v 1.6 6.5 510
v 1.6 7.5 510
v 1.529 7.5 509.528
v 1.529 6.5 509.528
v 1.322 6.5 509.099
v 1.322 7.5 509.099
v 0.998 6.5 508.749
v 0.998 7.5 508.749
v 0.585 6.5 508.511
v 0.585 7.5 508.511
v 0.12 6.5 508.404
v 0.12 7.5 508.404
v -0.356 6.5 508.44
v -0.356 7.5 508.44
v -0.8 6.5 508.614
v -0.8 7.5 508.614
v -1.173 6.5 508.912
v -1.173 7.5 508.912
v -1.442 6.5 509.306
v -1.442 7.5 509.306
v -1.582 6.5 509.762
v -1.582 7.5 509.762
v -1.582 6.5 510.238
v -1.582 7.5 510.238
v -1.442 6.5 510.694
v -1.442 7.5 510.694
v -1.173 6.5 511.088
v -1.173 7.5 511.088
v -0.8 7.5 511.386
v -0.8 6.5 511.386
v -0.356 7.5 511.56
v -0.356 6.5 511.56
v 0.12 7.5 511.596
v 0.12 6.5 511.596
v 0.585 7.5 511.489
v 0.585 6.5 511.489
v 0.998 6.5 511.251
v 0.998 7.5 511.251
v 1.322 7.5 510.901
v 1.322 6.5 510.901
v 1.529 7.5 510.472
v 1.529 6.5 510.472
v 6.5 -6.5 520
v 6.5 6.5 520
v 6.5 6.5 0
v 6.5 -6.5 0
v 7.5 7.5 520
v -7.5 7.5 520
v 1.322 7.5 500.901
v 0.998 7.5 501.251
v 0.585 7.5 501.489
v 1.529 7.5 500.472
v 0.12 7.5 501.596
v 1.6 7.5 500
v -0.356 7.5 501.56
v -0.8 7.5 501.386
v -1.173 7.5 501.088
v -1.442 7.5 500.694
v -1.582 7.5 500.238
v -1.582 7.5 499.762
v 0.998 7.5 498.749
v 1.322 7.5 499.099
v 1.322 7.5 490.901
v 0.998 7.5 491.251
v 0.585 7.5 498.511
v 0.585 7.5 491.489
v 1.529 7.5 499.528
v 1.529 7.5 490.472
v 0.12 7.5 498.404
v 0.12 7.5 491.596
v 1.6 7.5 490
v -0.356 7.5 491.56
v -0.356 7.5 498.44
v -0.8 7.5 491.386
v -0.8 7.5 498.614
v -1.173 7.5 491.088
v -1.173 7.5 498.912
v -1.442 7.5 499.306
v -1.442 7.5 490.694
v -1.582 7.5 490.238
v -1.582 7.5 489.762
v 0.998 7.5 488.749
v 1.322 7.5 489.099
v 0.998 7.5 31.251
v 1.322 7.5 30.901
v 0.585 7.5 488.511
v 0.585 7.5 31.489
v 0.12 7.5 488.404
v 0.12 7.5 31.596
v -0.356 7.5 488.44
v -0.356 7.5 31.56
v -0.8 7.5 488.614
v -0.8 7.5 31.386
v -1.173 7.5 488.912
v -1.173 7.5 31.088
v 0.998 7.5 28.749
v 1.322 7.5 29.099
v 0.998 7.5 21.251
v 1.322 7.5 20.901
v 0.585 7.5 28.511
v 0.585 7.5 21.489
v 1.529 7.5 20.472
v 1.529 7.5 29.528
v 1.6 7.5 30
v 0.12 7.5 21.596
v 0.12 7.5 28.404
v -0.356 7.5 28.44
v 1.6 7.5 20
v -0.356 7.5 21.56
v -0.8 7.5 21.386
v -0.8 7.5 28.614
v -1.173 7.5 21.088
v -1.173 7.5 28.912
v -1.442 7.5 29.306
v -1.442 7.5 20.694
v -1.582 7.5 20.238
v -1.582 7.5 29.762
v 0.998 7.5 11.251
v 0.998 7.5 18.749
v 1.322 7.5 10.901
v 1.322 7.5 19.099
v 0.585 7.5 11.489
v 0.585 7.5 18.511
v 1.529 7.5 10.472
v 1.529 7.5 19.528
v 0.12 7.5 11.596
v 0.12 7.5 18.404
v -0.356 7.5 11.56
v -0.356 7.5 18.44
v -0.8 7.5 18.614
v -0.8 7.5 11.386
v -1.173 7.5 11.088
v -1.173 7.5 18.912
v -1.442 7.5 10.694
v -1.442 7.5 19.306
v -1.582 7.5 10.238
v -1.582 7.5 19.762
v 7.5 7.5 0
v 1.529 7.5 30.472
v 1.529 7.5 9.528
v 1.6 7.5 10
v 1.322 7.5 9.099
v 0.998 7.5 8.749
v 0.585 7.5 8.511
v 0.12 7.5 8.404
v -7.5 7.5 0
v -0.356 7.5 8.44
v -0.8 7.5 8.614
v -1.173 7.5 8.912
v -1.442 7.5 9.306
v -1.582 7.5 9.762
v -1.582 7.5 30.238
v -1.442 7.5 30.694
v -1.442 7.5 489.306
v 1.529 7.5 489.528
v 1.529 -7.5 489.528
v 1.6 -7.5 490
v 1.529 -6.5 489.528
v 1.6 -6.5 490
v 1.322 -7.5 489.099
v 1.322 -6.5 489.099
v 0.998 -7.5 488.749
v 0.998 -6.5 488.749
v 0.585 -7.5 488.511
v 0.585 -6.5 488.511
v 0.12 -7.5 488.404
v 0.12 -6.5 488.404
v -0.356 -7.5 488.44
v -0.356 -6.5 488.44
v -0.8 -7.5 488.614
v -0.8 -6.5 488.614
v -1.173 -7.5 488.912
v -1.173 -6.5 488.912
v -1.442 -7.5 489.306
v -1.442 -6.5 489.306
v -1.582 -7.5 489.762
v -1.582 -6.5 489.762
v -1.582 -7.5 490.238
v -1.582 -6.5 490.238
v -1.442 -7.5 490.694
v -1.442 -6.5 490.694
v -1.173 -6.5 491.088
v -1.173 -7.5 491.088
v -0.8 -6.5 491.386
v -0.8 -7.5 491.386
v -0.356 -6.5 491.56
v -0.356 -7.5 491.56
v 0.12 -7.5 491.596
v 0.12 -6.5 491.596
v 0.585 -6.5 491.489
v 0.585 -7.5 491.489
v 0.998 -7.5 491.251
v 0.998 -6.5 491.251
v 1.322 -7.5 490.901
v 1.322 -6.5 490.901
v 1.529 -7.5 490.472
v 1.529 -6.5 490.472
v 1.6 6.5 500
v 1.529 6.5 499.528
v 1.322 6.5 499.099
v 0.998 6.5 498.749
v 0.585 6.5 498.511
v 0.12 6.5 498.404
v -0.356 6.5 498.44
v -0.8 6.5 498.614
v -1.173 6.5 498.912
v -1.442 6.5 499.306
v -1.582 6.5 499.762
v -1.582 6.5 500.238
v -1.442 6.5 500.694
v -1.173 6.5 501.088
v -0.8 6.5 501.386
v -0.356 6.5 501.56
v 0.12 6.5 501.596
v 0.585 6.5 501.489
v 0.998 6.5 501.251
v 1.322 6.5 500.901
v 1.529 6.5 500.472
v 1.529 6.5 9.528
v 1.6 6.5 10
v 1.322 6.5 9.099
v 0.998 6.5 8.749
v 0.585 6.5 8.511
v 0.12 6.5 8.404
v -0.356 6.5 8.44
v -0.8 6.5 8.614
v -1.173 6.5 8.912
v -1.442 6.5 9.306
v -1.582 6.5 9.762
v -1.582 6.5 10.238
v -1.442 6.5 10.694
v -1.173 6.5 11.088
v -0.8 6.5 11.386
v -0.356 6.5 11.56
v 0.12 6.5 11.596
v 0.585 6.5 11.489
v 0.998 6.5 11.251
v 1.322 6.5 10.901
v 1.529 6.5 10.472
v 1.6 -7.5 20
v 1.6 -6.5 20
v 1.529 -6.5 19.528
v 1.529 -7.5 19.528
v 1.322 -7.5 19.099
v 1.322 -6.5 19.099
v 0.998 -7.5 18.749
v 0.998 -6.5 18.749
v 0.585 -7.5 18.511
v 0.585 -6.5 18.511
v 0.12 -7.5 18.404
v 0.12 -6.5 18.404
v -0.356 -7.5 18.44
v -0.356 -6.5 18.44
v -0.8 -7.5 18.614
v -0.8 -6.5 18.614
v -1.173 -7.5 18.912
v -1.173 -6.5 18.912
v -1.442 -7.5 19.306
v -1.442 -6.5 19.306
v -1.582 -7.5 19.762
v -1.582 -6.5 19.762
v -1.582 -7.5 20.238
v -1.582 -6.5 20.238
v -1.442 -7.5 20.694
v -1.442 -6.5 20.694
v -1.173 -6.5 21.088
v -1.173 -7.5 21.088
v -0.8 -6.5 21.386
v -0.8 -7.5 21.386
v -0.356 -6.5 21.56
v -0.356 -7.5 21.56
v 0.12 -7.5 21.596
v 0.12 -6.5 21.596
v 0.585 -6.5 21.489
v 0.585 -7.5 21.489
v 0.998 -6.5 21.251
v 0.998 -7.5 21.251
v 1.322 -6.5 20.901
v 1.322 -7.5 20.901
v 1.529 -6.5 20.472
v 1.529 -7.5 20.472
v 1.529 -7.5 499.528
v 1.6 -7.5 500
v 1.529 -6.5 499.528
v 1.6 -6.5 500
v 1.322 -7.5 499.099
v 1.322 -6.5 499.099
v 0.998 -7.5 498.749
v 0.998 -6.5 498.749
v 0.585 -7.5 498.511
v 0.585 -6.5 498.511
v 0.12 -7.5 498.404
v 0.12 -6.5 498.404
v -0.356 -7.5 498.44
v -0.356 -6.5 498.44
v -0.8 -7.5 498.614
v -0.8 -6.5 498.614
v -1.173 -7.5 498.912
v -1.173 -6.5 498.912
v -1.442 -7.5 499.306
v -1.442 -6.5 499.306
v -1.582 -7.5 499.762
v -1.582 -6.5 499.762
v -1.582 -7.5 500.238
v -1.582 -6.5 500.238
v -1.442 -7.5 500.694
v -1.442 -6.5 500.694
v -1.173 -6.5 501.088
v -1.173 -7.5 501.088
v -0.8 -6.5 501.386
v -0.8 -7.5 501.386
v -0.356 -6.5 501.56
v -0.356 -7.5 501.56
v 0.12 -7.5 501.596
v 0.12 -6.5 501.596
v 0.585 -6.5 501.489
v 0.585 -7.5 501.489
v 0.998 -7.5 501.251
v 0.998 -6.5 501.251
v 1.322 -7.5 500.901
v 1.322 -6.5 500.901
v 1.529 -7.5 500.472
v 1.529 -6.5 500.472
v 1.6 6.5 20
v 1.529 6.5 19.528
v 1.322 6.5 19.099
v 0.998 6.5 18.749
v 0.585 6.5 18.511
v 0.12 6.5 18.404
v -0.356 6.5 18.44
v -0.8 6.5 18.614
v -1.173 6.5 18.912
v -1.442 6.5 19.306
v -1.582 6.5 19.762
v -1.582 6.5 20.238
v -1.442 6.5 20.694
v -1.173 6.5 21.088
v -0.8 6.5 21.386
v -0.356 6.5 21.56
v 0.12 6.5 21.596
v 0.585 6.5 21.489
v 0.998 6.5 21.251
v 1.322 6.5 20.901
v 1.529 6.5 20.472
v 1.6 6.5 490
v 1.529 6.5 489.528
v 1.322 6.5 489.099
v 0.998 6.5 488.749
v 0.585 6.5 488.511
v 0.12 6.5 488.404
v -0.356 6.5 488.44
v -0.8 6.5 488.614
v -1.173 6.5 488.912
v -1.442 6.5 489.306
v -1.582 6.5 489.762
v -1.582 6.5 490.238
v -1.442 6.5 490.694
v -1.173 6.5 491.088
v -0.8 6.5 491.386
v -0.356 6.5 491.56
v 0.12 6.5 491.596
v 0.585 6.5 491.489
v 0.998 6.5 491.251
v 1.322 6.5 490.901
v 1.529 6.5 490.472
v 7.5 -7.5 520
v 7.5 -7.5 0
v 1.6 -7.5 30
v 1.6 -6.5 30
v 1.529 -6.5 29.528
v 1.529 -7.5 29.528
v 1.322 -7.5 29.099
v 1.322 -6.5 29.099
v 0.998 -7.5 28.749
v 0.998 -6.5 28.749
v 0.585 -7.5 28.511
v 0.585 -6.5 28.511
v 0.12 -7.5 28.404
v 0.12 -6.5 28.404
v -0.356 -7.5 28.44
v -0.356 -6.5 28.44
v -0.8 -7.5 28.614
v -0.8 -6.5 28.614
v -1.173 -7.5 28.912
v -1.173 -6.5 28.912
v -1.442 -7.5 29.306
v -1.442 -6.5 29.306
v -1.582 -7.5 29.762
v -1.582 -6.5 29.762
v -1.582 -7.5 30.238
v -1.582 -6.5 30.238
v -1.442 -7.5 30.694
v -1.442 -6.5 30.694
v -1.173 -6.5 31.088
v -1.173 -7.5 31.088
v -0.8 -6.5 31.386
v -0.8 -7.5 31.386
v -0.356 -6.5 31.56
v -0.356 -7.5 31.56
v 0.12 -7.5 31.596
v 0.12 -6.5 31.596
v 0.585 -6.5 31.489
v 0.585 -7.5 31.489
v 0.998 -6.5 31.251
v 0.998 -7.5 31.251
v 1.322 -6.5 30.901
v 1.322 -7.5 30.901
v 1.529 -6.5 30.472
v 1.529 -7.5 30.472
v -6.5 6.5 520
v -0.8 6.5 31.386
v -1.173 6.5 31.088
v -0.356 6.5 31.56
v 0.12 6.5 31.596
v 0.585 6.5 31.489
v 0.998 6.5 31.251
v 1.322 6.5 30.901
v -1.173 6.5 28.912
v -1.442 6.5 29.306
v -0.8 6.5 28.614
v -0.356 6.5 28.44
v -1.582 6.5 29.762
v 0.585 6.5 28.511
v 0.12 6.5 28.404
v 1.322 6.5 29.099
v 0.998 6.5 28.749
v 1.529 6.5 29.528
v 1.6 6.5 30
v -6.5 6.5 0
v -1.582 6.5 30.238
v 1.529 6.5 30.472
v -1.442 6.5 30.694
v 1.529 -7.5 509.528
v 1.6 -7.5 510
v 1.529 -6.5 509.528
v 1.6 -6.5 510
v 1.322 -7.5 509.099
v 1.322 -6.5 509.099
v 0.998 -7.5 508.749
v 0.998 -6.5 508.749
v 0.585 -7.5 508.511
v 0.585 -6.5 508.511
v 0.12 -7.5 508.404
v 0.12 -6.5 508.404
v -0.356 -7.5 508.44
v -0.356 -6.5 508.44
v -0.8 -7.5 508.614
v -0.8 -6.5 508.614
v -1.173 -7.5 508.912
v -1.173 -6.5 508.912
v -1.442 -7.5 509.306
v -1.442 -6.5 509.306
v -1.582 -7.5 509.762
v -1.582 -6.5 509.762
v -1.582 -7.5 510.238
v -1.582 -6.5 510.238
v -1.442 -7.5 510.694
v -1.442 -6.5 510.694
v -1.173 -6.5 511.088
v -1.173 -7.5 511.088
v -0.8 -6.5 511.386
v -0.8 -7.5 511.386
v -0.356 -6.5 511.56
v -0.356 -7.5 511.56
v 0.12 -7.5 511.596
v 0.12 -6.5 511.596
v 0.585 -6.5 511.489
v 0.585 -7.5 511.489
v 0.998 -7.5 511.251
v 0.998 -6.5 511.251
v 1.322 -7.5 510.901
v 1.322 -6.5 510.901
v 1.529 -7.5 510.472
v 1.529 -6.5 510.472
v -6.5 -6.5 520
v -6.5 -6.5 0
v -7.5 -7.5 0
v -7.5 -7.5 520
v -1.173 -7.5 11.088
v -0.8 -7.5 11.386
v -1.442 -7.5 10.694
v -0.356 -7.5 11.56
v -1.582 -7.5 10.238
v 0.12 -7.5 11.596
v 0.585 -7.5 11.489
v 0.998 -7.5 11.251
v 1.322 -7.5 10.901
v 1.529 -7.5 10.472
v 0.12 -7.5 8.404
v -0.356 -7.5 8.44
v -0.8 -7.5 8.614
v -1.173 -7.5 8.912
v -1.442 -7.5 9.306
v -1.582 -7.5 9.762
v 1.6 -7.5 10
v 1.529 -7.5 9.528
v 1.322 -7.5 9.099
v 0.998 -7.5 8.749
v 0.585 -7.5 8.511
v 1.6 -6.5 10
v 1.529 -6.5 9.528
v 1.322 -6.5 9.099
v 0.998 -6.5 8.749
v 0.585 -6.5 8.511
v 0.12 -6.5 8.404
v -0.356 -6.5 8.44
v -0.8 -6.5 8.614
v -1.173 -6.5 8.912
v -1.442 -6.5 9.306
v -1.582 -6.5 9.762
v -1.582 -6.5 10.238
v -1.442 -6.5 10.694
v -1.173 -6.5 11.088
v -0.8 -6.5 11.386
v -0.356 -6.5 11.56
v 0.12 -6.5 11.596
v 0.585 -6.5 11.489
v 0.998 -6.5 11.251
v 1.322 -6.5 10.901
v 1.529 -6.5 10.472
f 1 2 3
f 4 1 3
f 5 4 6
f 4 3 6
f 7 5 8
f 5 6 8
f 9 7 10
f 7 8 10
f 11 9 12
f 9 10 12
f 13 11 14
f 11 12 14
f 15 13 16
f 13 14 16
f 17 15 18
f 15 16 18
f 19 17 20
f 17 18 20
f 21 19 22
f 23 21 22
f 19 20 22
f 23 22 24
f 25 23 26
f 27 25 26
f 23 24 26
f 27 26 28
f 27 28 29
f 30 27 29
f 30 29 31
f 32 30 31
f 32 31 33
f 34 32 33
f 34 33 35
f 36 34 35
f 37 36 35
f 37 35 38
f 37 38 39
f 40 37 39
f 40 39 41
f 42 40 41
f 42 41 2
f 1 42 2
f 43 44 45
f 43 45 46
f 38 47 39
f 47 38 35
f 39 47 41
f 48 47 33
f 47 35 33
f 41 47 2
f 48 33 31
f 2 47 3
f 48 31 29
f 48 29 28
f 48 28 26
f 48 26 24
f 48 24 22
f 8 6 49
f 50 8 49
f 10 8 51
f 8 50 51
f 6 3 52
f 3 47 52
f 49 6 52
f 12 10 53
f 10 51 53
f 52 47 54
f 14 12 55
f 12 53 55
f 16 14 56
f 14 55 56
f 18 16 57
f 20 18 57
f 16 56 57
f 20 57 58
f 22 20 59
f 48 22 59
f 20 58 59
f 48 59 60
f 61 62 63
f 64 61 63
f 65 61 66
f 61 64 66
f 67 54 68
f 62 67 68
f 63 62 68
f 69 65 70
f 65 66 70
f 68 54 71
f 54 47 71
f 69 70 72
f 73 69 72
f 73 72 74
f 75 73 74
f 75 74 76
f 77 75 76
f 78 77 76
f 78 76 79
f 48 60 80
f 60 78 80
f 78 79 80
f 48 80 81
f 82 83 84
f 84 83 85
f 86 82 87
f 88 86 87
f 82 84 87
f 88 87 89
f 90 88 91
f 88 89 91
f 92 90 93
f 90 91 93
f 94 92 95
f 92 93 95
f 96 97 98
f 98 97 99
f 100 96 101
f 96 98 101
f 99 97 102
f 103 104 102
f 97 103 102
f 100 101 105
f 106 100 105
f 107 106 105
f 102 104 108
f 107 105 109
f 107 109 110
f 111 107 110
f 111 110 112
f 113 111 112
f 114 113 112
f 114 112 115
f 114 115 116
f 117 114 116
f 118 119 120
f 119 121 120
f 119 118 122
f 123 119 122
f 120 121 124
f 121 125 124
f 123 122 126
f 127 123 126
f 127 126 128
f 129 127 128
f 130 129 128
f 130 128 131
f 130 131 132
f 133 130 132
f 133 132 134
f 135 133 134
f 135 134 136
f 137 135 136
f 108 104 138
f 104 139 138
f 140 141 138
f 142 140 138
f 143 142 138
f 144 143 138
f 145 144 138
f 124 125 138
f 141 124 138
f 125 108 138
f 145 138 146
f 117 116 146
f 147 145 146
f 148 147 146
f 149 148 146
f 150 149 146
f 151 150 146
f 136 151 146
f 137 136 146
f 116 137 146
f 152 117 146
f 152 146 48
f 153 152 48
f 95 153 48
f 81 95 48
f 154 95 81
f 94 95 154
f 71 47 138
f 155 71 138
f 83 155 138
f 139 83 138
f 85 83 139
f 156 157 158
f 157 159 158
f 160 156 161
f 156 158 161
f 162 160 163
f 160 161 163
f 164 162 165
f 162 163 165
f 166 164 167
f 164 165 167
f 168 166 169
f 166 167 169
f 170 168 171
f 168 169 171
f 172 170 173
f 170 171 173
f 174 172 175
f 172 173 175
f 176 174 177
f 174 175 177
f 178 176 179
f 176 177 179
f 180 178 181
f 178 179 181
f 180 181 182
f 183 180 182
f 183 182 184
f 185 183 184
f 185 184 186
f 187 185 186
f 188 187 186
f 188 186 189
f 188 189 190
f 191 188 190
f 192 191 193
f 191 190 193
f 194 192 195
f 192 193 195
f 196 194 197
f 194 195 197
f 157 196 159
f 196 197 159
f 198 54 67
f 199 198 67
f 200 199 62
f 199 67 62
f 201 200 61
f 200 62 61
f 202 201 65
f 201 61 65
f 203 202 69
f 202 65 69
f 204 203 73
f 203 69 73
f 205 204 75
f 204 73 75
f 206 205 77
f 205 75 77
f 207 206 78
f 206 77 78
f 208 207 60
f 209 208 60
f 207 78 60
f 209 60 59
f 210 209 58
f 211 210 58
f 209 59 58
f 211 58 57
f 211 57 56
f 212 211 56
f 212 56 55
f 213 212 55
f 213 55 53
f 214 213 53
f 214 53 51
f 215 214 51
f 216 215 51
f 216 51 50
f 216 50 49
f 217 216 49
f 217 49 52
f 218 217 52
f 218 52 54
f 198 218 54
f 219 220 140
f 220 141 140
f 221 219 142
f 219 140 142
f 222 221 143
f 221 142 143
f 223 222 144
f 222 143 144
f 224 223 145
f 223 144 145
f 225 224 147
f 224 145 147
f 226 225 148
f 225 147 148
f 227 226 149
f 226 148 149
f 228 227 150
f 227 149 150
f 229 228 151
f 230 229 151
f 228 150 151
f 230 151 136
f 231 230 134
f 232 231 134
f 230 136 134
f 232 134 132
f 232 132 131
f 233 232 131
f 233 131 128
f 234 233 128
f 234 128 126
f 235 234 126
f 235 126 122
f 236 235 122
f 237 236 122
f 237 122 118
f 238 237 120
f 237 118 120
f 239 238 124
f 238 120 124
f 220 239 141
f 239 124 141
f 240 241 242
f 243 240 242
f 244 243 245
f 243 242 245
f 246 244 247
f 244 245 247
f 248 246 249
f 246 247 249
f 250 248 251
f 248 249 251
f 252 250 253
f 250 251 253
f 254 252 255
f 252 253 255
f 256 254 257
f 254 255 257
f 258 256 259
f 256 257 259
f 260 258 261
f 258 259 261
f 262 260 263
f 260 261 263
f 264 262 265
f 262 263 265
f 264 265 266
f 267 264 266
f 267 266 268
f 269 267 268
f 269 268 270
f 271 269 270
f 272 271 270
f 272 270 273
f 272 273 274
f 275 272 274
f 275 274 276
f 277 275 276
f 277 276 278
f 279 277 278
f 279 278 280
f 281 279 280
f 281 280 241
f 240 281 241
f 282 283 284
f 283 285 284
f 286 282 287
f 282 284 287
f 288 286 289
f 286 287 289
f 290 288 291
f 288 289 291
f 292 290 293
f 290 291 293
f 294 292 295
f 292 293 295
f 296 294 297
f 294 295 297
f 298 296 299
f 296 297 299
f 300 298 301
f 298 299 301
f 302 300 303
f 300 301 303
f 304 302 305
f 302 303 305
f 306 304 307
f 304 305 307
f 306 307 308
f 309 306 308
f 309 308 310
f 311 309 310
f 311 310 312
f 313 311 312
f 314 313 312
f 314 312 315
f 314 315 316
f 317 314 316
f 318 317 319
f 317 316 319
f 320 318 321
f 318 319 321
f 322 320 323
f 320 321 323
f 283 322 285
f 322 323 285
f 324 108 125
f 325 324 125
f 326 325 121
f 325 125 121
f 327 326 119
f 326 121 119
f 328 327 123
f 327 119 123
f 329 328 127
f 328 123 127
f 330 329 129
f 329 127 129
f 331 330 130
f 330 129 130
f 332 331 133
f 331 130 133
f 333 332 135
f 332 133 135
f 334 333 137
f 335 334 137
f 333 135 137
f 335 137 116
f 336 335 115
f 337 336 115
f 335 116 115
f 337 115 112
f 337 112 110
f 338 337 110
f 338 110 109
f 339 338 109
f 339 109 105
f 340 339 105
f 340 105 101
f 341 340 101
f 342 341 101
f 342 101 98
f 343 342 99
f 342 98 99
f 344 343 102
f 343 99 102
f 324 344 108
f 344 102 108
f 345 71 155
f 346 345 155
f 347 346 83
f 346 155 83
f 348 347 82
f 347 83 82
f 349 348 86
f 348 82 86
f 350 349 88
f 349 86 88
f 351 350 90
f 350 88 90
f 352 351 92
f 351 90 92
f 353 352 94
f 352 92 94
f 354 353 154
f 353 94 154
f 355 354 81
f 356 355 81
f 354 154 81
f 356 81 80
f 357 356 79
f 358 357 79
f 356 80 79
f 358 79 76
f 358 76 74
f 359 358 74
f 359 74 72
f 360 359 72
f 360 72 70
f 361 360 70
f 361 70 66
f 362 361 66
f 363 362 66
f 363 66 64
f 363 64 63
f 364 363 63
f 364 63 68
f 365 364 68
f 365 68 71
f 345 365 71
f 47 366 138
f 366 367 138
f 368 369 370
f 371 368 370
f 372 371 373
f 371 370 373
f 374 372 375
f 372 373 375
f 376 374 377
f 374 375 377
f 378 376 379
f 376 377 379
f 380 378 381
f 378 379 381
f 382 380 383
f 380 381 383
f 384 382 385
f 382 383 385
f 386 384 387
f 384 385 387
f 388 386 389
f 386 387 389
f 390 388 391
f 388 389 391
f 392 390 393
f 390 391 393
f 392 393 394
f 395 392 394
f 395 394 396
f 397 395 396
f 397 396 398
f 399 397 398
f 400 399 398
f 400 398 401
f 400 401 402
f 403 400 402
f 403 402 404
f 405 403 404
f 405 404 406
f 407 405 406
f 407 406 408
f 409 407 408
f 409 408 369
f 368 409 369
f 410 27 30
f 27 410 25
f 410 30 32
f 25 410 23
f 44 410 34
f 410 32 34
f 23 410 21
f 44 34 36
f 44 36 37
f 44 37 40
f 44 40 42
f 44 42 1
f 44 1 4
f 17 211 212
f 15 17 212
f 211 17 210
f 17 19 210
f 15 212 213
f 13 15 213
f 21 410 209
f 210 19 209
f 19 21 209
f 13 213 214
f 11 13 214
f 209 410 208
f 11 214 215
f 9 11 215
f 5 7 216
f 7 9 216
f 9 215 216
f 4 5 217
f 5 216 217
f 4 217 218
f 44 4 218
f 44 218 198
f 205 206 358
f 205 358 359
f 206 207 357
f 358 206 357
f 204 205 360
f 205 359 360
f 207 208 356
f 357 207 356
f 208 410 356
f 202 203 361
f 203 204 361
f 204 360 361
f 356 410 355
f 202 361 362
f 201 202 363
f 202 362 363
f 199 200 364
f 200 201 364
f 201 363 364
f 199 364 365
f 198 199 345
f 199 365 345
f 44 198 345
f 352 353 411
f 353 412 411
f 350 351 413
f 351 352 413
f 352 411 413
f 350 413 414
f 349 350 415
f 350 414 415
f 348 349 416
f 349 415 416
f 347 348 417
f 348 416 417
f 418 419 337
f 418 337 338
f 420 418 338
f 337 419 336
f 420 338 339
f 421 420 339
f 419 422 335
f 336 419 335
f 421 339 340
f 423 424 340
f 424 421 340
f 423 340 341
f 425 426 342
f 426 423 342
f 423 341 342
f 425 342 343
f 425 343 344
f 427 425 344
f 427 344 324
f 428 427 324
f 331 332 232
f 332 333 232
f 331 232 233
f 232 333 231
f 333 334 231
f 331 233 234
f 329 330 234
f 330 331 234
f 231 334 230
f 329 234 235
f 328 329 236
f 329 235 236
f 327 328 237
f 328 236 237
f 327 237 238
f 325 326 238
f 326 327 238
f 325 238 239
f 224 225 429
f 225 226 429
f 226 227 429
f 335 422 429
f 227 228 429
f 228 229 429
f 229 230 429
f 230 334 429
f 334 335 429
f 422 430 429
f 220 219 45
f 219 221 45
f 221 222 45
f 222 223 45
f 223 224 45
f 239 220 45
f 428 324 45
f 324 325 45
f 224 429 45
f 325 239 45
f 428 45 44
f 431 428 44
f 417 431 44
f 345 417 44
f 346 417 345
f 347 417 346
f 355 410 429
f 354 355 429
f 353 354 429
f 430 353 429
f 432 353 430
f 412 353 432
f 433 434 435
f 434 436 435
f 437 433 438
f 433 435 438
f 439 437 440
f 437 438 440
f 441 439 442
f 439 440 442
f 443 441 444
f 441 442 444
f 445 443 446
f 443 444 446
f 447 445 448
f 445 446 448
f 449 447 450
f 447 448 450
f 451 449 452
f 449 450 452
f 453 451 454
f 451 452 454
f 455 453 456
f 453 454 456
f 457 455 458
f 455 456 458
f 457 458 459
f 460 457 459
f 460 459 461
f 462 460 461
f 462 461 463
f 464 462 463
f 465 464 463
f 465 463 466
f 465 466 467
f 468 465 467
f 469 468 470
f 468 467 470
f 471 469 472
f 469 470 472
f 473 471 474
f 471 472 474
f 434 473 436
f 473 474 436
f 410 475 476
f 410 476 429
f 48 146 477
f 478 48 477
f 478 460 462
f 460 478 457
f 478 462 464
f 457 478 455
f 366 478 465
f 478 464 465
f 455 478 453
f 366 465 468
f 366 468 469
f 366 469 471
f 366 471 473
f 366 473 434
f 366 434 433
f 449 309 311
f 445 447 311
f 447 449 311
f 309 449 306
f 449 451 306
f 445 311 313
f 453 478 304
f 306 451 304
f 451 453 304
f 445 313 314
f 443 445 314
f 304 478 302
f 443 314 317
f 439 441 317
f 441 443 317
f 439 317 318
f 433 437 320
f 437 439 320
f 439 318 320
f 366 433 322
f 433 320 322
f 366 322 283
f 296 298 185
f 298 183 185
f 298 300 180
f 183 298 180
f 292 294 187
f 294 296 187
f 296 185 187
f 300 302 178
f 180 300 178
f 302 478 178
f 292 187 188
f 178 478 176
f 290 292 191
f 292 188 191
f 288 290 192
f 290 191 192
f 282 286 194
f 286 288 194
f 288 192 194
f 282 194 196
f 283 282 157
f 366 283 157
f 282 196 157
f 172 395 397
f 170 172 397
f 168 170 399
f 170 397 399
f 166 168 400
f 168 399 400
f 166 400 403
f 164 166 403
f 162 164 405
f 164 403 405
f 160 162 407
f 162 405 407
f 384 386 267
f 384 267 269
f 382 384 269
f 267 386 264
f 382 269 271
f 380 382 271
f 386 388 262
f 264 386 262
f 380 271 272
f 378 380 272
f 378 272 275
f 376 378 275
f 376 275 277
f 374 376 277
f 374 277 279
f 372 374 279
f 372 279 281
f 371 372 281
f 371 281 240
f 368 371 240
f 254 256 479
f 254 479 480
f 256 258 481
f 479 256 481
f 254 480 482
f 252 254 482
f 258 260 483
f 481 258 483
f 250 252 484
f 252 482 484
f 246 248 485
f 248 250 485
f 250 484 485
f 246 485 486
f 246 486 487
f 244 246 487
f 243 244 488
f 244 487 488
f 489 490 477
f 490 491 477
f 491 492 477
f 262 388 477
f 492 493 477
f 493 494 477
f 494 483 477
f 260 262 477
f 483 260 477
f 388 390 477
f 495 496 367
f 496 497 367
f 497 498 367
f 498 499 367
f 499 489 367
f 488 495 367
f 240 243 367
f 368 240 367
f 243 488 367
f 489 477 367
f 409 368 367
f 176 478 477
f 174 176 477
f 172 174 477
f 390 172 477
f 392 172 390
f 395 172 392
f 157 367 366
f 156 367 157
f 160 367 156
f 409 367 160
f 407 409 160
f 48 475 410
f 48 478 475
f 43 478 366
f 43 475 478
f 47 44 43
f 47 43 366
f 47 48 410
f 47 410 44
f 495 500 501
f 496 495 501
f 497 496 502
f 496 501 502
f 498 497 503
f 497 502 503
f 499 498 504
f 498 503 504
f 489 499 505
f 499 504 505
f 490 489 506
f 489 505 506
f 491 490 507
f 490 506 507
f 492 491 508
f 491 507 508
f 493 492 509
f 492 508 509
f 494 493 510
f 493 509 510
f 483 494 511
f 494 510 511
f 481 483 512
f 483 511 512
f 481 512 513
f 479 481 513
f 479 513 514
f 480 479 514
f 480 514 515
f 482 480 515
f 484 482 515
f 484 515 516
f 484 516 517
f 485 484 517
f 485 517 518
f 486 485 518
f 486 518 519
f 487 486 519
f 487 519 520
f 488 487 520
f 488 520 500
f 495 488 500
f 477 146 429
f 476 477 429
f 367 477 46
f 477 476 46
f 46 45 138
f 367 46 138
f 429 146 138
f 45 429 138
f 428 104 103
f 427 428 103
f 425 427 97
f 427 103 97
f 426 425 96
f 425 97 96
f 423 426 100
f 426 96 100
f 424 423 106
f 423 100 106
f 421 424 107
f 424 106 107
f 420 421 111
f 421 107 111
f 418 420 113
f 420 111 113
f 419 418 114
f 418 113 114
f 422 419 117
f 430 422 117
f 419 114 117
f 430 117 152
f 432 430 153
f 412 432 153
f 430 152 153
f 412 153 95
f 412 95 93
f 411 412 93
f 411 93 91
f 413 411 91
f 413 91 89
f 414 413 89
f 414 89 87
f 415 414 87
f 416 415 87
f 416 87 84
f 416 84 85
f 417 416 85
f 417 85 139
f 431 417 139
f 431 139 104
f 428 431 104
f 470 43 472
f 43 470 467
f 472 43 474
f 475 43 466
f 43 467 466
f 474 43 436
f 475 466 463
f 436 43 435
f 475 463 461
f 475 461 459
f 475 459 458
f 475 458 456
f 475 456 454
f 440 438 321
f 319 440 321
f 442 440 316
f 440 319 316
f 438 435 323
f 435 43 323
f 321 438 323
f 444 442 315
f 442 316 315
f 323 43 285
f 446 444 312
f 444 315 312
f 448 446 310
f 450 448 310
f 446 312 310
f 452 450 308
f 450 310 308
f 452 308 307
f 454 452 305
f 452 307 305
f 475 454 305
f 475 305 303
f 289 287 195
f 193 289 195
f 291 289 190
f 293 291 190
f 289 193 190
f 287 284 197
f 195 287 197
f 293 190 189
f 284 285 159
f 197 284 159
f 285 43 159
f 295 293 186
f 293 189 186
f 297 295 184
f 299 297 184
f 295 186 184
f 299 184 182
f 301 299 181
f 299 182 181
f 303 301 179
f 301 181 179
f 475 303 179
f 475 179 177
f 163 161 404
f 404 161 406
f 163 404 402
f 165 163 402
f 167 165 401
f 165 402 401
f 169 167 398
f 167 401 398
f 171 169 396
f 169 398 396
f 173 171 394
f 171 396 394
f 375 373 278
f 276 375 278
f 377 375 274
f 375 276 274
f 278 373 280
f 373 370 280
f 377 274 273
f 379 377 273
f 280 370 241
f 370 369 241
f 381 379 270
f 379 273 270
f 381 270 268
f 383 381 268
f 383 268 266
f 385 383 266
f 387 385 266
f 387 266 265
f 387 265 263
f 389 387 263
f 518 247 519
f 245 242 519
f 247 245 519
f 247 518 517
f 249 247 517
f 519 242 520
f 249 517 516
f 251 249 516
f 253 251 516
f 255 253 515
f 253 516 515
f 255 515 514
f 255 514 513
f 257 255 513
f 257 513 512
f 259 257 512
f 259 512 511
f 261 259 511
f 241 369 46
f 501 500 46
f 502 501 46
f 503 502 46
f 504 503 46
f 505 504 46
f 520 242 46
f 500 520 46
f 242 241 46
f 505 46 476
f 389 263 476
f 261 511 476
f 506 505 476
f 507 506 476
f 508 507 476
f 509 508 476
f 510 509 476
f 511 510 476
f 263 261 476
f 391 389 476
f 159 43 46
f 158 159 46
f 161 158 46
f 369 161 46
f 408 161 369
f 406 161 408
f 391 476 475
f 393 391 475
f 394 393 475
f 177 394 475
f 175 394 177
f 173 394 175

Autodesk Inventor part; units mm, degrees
ref_plane "YZ Plane" through (0, 0, 0) normal (1, 0, 0) x (0, 1, 0)
ref_plane "XZ Plane" through (0, 0, 0) normal (0, 1, 0) x (-1, 0, 0)
ref_plane "XY Plane" through (0, 0, 0) normal (0, 0, 1) x (1, 0, 0)
sketch "スケッチ1" plane through (0, 0, 0) normal (0, 0, 1) x (1, 0, 0)
  line L0 (7.5, 7.5) -> (-7.5, 7.5)
  line L1 (-7.5, 7.5) -> (-7.5, -7.5)
  line L2 (-7.5, -7.5) -> (7.5, -7.5)
  line L3 (7.5, -7.5) -> (7.5, 7.5)
  line L4 (7.5, 7.5) -> (-7.5, -7.5) construction
  line L5 (-7.5, 7.5) -> (7.5, -7.5) construction
  line L6 (-6.5, 6.5) -> (6.5, 6.5)
  line L7 (6.5, 6.5) -> (6.5, -6.5)
  line L8 (6.5, -6.5) -> (-6.5, -6.5)
  line L9 (-6.5, -6.5) -> (-6.5, 6.5)
  point P0 (0, 0)
  dimension "d0" = 15
  dimension "d1" = 15
  dimension "d2" = 1
extrude "押し出し1" add sketch "スケッチ1" along normal blind 520
sketch "スケッチ2" plane through (-7.5, 7.5, 0) normal (0, 1, 0) x (1, 0, 0)
  circle A0 centre (7.5, -10) radius 1.6
  circle A1 centre (7.5, -20) radius 1.6
  circle A2 centre (7.5, -30) radius 1.6
  line L0 (15, 0) -> (0, 0) projected
  circle A3 centre (7.5, -490) radius 1.6
  circle A4 centre (7.5, -500) radius 1.6
  circle A5 centre (7.5, -510) radius 1.6
  line L1 (15, -520) -> (0, -520) projected
  point P0 (7.5, 0)
  point P1 (7.5, 0)
  dimension "d5" = 3.2
  dimension "d6" = 3.2
  dimension "d7" = 3.2
  dimension "d8" = 10
  dimension "d9" = 10
  dimension "d10" = 10
  dimension "d11" = 3.2
  dimension "d12" = 3.2
  dimension "d13" = 3.2
  dimension "d14" = 10
  dimension "d15" = 10
  dimension "d16" = 10
extrude "押し出し2" cut sketch "スケッチ2" against normal through all
properties part number "プレート保持_角柱3" material "アルミニウム 6061"
